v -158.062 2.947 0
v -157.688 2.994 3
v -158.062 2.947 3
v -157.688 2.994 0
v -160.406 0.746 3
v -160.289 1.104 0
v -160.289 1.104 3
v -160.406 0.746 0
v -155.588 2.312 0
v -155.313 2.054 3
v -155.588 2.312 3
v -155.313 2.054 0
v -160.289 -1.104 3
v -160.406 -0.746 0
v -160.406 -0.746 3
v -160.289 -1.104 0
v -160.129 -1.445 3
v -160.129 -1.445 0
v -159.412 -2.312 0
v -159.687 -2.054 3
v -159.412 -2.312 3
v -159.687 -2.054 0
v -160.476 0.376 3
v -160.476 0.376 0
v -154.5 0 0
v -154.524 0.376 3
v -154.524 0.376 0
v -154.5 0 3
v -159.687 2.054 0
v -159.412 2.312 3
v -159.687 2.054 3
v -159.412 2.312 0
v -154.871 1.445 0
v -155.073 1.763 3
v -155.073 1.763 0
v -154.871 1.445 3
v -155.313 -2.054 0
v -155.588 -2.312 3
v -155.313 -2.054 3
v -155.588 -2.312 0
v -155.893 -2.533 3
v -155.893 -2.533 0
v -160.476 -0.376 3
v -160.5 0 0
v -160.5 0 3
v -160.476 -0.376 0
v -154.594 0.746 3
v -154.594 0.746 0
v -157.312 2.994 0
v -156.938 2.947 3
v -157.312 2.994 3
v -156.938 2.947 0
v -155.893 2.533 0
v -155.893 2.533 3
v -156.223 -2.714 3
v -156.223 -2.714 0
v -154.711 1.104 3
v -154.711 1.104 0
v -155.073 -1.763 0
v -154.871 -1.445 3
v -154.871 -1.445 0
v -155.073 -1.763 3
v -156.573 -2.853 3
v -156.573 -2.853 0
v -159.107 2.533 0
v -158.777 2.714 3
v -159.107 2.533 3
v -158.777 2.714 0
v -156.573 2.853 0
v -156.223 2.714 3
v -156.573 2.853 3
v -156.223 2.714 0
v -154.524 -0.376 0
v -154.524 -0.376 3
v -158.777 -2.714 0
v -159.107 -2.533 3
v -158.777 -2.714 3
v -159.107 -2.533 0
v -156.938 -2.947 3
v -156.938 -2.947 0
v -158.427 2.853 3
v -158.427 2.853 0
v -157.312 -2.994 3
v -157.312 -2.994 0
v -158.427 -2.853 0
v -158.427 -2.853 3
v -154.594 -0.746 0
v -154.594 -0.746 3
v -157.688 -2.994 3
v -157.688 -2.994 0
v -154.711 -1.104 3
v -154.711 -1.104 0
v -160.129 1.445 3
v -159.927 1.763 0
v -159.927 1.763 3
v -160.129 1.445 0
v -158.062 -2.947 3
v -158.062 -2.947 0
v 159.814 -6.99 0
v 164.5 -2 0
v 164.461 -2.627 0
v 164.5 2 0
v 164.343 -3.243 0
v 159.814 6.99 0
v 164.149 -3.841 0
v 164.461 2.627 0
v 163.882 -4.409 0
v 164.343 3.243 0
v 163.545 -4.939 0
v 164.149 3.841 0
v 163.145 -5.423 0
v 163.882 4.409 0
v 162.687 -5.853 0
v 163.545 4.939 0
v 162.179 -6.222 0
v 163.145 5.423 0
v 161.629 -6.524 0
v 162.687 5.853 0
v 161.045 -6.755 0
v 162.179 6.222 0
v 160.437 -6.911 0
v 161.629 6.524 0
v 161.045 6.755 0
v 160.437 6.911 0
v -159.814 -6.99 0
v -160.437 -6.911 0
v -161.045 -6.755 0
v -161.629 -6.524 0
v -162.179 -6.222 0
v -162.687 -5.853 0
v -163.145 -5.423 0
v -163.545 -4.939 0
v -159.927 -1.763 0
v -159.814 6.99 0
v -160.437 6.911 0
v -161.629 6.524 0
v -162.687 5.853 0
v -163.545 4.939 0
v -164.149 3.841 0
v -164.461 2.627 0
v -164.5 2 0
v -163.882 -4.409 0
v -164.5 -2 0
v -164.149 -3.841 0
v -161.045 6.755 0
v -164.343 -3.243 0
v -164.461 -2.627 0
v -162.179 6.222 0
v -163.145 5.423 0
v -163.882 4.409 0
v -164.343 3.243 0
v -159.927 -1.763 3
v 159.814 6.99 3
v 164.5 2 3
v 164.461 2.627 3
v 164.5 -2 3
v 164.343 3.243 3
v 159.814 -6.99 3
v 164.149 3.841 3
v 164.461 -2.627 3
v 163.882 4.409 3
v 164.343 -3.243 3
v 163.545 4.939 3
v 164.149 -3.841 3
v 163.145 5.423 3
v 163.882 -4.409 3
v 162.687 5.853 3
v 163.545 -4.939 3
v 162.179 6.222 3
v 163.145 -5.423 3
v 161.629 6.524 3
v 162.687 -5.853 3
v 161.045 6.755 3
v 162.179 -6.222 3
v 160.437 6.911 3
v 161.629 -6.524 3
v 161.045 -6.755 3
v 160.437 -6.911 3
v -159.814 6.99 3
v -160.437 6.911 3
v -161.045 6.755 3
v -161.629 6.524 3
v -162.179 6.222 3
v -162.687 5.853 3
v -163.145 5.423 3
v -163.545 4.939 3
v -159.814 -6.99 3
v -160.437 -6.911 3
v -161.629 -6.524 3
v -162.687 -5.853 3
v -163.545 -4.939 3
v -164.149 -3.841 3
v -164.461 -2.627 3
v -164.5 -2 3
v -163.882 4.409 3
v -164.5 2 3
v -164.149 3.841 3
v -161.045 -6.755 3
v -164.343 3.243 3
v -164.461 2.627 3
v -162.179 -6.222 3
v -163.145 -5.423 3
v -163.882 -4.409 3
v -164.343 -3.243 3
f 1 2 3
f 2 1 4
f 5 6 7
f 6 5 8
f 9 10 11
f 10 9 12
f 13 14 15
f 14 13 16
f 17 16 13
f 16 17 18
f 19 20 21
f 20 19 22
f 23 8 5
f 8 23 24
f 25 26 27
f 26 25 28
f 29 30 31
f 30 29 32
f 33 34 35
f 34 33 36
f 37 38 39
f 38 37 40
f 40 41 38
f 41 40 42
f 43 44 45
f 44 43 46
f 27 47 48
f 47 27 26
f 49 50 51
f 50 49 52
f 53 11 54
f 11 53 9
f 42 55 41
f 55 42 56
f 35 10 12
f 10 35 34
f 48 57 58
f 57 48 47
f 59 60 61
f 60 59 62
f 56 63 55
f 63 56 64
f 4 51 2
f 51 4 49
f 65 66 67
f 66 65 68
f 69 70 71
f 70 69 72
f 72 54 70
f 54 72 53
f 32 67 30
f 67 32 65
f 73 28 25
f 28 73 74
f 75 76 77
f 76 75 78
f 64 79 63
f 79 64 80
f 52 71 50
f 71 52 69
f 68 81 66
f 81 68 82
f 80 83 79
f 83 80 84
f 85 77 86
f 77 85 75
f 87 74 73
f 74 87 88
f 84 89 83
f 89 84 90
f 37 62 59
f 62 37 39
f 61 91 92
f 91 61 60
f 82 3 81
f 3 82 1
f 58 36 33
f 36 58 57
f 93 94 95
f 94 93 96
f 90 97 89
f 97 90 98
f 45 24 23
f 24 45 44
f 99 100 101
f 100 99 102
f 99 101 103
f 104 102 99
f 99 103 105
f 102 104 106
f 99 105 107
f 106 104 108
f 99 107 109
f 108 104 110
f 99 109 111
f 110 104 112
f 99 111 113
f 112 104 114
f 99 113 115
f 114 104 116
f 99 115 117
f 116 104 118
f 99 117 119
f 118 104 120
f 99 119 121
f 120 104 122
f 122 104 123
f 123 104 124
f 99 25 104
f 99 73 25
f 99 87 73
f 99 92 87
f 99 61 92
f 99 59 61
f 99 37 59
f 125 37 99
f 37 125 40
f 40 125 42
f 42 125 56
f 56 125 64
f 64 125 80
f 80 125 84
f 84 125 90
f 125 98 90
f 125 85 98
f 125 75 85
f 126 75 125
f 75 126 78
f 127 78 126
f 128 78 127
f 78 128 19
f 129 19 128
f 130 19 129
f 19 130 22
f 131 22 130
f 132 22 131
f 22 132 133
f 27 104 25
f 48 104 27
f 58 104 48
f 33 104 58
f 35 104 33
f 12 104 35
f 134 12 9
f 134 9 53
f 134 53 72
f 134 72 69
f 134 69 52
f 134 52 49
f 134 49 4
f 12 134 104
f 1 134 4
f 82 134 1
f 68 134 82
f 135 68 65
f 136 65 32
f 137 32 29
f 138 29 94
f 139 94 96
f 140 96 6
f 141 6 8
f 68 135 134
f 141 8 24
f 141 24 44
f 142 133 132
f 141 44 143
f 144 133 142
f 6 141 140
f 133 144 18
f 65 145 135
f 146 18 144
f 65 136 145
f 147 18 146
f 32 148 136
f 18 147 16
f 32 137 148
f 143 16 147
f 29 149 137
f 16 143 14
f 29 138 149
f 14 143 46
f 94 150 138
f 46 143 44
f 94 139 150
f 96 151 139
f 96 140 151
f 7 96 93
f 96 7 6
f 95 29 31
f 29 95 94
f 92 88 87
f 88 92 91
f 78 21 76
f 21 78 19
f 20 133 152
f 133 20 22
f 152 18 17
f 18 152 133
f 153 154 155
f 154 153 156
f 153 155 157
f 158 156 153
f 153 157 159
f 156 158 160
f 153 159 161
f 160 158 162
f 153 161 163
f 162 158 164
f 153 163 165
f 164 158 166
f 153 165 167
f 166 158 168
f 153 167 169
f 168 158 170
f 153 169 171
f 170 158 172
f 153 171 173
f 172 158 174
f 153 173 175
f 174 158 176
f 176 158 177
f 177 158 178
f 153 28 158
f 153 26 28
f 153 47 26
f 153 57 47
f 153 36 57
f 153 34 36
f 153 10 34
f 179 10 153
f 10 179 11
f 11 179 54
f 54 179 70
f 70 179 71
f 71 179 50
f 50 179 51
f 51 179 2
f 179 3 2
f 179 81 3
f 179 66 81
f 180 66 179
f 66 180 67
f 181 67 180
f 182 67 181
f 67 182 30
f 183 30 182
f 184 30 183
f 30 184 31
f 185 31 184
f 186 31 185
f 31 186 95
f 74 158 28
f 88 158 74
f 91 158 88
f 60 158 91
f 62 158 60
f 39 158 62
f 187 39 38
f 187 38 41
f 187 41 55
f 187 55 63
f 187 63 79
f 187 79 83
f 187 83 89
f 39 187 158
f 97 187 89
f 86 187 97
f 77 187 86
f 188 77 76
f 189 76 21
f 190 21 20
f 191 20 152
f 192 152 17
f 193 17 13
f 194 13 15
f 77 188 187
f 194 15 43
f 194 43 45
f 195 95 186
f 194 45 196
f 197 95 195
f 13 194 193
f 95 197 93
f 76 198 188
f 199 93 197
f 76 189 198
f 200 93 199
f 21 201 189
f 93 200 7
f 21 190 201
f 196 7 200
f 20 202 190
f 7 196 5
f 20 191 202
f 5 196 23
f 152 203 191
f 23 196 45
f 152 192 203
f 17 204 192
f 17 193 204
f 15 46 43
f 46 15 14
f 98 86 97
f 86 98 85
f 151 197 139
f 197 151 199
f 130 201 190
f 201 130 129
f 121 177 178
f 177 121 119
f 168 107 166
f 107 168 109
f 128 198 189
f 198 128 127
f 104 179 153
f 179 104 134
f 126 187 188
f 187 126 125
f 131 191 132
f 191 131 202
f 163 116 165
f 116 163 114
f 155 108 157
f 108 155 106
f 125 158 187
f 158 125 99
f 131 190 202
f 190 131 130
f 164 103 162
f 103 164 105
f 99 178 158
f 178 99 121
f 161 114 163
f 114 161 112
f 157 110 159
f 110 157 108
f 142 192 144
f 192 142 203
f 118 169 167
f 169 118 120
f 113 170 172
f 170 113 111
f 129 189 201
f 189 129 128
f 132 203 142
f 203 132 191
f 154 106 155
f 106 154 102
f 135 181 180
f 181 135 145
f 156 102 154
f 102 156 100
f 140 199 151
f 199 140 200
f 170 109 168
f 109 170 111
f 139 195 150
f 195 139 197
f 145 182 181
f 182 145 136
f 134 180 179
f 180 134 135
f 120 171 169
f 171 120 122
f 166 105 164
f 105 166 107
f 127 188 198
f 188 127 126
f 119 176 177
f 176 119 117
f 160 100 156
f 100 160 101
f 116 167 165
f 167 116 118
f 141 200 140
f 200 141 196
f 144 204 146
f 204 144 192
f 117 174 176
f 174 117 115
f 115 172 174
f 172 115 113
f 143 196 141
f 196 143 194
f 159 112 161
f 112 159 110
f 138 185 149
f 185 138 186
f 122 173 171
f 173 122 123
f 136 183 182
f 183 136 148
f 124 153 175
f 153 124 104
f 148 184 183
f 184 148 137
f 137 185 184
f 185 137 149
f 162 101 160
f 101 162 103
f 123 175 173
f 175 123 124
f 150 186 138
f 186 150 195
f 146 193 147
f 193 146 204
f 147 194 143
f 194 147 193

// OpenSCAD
$fn = 50;


difference() {
	union() {
		hull() {
			translate(v = [-159.5000000000, 2.0000000000, 0]) {
				cylinder(h = 3, r = 5);
			}
			translate(v = [159.5000000000, 2.0000000000, 0]) {
				cylinder(h = 3, r = 5);
			}
			translate(v = [-159.5000000000, -2.0000000000, 0]) {
				cylinder(h = 3, r = 5);
			}
			translate(v = [159.5000000000, -2.0000000000, 0]) {
				cylinder(h = 3, r = 5);
			}
		}
	}
	union() {
		translate(v = [-157.5000000000, 0.0000000000, 0]) {
			cylinder(h = 3, r = 3.0000000000);
		}
		translate(v = [-157.5000000000, 0.0000000000, 0]) {
			cylinder(h = 3, r = 1.5000000000);
		}
		translate(v = [-157.5000000000, 0.0000000000, 0]) {
			cylinder(h = 3, r = 1.5000000000);
		}
		translate(v = [-157.5000000000, 0.0000000000, 0]) {
			cylinder(h = 3, r = 1.5000000000);
		}
	}
}
